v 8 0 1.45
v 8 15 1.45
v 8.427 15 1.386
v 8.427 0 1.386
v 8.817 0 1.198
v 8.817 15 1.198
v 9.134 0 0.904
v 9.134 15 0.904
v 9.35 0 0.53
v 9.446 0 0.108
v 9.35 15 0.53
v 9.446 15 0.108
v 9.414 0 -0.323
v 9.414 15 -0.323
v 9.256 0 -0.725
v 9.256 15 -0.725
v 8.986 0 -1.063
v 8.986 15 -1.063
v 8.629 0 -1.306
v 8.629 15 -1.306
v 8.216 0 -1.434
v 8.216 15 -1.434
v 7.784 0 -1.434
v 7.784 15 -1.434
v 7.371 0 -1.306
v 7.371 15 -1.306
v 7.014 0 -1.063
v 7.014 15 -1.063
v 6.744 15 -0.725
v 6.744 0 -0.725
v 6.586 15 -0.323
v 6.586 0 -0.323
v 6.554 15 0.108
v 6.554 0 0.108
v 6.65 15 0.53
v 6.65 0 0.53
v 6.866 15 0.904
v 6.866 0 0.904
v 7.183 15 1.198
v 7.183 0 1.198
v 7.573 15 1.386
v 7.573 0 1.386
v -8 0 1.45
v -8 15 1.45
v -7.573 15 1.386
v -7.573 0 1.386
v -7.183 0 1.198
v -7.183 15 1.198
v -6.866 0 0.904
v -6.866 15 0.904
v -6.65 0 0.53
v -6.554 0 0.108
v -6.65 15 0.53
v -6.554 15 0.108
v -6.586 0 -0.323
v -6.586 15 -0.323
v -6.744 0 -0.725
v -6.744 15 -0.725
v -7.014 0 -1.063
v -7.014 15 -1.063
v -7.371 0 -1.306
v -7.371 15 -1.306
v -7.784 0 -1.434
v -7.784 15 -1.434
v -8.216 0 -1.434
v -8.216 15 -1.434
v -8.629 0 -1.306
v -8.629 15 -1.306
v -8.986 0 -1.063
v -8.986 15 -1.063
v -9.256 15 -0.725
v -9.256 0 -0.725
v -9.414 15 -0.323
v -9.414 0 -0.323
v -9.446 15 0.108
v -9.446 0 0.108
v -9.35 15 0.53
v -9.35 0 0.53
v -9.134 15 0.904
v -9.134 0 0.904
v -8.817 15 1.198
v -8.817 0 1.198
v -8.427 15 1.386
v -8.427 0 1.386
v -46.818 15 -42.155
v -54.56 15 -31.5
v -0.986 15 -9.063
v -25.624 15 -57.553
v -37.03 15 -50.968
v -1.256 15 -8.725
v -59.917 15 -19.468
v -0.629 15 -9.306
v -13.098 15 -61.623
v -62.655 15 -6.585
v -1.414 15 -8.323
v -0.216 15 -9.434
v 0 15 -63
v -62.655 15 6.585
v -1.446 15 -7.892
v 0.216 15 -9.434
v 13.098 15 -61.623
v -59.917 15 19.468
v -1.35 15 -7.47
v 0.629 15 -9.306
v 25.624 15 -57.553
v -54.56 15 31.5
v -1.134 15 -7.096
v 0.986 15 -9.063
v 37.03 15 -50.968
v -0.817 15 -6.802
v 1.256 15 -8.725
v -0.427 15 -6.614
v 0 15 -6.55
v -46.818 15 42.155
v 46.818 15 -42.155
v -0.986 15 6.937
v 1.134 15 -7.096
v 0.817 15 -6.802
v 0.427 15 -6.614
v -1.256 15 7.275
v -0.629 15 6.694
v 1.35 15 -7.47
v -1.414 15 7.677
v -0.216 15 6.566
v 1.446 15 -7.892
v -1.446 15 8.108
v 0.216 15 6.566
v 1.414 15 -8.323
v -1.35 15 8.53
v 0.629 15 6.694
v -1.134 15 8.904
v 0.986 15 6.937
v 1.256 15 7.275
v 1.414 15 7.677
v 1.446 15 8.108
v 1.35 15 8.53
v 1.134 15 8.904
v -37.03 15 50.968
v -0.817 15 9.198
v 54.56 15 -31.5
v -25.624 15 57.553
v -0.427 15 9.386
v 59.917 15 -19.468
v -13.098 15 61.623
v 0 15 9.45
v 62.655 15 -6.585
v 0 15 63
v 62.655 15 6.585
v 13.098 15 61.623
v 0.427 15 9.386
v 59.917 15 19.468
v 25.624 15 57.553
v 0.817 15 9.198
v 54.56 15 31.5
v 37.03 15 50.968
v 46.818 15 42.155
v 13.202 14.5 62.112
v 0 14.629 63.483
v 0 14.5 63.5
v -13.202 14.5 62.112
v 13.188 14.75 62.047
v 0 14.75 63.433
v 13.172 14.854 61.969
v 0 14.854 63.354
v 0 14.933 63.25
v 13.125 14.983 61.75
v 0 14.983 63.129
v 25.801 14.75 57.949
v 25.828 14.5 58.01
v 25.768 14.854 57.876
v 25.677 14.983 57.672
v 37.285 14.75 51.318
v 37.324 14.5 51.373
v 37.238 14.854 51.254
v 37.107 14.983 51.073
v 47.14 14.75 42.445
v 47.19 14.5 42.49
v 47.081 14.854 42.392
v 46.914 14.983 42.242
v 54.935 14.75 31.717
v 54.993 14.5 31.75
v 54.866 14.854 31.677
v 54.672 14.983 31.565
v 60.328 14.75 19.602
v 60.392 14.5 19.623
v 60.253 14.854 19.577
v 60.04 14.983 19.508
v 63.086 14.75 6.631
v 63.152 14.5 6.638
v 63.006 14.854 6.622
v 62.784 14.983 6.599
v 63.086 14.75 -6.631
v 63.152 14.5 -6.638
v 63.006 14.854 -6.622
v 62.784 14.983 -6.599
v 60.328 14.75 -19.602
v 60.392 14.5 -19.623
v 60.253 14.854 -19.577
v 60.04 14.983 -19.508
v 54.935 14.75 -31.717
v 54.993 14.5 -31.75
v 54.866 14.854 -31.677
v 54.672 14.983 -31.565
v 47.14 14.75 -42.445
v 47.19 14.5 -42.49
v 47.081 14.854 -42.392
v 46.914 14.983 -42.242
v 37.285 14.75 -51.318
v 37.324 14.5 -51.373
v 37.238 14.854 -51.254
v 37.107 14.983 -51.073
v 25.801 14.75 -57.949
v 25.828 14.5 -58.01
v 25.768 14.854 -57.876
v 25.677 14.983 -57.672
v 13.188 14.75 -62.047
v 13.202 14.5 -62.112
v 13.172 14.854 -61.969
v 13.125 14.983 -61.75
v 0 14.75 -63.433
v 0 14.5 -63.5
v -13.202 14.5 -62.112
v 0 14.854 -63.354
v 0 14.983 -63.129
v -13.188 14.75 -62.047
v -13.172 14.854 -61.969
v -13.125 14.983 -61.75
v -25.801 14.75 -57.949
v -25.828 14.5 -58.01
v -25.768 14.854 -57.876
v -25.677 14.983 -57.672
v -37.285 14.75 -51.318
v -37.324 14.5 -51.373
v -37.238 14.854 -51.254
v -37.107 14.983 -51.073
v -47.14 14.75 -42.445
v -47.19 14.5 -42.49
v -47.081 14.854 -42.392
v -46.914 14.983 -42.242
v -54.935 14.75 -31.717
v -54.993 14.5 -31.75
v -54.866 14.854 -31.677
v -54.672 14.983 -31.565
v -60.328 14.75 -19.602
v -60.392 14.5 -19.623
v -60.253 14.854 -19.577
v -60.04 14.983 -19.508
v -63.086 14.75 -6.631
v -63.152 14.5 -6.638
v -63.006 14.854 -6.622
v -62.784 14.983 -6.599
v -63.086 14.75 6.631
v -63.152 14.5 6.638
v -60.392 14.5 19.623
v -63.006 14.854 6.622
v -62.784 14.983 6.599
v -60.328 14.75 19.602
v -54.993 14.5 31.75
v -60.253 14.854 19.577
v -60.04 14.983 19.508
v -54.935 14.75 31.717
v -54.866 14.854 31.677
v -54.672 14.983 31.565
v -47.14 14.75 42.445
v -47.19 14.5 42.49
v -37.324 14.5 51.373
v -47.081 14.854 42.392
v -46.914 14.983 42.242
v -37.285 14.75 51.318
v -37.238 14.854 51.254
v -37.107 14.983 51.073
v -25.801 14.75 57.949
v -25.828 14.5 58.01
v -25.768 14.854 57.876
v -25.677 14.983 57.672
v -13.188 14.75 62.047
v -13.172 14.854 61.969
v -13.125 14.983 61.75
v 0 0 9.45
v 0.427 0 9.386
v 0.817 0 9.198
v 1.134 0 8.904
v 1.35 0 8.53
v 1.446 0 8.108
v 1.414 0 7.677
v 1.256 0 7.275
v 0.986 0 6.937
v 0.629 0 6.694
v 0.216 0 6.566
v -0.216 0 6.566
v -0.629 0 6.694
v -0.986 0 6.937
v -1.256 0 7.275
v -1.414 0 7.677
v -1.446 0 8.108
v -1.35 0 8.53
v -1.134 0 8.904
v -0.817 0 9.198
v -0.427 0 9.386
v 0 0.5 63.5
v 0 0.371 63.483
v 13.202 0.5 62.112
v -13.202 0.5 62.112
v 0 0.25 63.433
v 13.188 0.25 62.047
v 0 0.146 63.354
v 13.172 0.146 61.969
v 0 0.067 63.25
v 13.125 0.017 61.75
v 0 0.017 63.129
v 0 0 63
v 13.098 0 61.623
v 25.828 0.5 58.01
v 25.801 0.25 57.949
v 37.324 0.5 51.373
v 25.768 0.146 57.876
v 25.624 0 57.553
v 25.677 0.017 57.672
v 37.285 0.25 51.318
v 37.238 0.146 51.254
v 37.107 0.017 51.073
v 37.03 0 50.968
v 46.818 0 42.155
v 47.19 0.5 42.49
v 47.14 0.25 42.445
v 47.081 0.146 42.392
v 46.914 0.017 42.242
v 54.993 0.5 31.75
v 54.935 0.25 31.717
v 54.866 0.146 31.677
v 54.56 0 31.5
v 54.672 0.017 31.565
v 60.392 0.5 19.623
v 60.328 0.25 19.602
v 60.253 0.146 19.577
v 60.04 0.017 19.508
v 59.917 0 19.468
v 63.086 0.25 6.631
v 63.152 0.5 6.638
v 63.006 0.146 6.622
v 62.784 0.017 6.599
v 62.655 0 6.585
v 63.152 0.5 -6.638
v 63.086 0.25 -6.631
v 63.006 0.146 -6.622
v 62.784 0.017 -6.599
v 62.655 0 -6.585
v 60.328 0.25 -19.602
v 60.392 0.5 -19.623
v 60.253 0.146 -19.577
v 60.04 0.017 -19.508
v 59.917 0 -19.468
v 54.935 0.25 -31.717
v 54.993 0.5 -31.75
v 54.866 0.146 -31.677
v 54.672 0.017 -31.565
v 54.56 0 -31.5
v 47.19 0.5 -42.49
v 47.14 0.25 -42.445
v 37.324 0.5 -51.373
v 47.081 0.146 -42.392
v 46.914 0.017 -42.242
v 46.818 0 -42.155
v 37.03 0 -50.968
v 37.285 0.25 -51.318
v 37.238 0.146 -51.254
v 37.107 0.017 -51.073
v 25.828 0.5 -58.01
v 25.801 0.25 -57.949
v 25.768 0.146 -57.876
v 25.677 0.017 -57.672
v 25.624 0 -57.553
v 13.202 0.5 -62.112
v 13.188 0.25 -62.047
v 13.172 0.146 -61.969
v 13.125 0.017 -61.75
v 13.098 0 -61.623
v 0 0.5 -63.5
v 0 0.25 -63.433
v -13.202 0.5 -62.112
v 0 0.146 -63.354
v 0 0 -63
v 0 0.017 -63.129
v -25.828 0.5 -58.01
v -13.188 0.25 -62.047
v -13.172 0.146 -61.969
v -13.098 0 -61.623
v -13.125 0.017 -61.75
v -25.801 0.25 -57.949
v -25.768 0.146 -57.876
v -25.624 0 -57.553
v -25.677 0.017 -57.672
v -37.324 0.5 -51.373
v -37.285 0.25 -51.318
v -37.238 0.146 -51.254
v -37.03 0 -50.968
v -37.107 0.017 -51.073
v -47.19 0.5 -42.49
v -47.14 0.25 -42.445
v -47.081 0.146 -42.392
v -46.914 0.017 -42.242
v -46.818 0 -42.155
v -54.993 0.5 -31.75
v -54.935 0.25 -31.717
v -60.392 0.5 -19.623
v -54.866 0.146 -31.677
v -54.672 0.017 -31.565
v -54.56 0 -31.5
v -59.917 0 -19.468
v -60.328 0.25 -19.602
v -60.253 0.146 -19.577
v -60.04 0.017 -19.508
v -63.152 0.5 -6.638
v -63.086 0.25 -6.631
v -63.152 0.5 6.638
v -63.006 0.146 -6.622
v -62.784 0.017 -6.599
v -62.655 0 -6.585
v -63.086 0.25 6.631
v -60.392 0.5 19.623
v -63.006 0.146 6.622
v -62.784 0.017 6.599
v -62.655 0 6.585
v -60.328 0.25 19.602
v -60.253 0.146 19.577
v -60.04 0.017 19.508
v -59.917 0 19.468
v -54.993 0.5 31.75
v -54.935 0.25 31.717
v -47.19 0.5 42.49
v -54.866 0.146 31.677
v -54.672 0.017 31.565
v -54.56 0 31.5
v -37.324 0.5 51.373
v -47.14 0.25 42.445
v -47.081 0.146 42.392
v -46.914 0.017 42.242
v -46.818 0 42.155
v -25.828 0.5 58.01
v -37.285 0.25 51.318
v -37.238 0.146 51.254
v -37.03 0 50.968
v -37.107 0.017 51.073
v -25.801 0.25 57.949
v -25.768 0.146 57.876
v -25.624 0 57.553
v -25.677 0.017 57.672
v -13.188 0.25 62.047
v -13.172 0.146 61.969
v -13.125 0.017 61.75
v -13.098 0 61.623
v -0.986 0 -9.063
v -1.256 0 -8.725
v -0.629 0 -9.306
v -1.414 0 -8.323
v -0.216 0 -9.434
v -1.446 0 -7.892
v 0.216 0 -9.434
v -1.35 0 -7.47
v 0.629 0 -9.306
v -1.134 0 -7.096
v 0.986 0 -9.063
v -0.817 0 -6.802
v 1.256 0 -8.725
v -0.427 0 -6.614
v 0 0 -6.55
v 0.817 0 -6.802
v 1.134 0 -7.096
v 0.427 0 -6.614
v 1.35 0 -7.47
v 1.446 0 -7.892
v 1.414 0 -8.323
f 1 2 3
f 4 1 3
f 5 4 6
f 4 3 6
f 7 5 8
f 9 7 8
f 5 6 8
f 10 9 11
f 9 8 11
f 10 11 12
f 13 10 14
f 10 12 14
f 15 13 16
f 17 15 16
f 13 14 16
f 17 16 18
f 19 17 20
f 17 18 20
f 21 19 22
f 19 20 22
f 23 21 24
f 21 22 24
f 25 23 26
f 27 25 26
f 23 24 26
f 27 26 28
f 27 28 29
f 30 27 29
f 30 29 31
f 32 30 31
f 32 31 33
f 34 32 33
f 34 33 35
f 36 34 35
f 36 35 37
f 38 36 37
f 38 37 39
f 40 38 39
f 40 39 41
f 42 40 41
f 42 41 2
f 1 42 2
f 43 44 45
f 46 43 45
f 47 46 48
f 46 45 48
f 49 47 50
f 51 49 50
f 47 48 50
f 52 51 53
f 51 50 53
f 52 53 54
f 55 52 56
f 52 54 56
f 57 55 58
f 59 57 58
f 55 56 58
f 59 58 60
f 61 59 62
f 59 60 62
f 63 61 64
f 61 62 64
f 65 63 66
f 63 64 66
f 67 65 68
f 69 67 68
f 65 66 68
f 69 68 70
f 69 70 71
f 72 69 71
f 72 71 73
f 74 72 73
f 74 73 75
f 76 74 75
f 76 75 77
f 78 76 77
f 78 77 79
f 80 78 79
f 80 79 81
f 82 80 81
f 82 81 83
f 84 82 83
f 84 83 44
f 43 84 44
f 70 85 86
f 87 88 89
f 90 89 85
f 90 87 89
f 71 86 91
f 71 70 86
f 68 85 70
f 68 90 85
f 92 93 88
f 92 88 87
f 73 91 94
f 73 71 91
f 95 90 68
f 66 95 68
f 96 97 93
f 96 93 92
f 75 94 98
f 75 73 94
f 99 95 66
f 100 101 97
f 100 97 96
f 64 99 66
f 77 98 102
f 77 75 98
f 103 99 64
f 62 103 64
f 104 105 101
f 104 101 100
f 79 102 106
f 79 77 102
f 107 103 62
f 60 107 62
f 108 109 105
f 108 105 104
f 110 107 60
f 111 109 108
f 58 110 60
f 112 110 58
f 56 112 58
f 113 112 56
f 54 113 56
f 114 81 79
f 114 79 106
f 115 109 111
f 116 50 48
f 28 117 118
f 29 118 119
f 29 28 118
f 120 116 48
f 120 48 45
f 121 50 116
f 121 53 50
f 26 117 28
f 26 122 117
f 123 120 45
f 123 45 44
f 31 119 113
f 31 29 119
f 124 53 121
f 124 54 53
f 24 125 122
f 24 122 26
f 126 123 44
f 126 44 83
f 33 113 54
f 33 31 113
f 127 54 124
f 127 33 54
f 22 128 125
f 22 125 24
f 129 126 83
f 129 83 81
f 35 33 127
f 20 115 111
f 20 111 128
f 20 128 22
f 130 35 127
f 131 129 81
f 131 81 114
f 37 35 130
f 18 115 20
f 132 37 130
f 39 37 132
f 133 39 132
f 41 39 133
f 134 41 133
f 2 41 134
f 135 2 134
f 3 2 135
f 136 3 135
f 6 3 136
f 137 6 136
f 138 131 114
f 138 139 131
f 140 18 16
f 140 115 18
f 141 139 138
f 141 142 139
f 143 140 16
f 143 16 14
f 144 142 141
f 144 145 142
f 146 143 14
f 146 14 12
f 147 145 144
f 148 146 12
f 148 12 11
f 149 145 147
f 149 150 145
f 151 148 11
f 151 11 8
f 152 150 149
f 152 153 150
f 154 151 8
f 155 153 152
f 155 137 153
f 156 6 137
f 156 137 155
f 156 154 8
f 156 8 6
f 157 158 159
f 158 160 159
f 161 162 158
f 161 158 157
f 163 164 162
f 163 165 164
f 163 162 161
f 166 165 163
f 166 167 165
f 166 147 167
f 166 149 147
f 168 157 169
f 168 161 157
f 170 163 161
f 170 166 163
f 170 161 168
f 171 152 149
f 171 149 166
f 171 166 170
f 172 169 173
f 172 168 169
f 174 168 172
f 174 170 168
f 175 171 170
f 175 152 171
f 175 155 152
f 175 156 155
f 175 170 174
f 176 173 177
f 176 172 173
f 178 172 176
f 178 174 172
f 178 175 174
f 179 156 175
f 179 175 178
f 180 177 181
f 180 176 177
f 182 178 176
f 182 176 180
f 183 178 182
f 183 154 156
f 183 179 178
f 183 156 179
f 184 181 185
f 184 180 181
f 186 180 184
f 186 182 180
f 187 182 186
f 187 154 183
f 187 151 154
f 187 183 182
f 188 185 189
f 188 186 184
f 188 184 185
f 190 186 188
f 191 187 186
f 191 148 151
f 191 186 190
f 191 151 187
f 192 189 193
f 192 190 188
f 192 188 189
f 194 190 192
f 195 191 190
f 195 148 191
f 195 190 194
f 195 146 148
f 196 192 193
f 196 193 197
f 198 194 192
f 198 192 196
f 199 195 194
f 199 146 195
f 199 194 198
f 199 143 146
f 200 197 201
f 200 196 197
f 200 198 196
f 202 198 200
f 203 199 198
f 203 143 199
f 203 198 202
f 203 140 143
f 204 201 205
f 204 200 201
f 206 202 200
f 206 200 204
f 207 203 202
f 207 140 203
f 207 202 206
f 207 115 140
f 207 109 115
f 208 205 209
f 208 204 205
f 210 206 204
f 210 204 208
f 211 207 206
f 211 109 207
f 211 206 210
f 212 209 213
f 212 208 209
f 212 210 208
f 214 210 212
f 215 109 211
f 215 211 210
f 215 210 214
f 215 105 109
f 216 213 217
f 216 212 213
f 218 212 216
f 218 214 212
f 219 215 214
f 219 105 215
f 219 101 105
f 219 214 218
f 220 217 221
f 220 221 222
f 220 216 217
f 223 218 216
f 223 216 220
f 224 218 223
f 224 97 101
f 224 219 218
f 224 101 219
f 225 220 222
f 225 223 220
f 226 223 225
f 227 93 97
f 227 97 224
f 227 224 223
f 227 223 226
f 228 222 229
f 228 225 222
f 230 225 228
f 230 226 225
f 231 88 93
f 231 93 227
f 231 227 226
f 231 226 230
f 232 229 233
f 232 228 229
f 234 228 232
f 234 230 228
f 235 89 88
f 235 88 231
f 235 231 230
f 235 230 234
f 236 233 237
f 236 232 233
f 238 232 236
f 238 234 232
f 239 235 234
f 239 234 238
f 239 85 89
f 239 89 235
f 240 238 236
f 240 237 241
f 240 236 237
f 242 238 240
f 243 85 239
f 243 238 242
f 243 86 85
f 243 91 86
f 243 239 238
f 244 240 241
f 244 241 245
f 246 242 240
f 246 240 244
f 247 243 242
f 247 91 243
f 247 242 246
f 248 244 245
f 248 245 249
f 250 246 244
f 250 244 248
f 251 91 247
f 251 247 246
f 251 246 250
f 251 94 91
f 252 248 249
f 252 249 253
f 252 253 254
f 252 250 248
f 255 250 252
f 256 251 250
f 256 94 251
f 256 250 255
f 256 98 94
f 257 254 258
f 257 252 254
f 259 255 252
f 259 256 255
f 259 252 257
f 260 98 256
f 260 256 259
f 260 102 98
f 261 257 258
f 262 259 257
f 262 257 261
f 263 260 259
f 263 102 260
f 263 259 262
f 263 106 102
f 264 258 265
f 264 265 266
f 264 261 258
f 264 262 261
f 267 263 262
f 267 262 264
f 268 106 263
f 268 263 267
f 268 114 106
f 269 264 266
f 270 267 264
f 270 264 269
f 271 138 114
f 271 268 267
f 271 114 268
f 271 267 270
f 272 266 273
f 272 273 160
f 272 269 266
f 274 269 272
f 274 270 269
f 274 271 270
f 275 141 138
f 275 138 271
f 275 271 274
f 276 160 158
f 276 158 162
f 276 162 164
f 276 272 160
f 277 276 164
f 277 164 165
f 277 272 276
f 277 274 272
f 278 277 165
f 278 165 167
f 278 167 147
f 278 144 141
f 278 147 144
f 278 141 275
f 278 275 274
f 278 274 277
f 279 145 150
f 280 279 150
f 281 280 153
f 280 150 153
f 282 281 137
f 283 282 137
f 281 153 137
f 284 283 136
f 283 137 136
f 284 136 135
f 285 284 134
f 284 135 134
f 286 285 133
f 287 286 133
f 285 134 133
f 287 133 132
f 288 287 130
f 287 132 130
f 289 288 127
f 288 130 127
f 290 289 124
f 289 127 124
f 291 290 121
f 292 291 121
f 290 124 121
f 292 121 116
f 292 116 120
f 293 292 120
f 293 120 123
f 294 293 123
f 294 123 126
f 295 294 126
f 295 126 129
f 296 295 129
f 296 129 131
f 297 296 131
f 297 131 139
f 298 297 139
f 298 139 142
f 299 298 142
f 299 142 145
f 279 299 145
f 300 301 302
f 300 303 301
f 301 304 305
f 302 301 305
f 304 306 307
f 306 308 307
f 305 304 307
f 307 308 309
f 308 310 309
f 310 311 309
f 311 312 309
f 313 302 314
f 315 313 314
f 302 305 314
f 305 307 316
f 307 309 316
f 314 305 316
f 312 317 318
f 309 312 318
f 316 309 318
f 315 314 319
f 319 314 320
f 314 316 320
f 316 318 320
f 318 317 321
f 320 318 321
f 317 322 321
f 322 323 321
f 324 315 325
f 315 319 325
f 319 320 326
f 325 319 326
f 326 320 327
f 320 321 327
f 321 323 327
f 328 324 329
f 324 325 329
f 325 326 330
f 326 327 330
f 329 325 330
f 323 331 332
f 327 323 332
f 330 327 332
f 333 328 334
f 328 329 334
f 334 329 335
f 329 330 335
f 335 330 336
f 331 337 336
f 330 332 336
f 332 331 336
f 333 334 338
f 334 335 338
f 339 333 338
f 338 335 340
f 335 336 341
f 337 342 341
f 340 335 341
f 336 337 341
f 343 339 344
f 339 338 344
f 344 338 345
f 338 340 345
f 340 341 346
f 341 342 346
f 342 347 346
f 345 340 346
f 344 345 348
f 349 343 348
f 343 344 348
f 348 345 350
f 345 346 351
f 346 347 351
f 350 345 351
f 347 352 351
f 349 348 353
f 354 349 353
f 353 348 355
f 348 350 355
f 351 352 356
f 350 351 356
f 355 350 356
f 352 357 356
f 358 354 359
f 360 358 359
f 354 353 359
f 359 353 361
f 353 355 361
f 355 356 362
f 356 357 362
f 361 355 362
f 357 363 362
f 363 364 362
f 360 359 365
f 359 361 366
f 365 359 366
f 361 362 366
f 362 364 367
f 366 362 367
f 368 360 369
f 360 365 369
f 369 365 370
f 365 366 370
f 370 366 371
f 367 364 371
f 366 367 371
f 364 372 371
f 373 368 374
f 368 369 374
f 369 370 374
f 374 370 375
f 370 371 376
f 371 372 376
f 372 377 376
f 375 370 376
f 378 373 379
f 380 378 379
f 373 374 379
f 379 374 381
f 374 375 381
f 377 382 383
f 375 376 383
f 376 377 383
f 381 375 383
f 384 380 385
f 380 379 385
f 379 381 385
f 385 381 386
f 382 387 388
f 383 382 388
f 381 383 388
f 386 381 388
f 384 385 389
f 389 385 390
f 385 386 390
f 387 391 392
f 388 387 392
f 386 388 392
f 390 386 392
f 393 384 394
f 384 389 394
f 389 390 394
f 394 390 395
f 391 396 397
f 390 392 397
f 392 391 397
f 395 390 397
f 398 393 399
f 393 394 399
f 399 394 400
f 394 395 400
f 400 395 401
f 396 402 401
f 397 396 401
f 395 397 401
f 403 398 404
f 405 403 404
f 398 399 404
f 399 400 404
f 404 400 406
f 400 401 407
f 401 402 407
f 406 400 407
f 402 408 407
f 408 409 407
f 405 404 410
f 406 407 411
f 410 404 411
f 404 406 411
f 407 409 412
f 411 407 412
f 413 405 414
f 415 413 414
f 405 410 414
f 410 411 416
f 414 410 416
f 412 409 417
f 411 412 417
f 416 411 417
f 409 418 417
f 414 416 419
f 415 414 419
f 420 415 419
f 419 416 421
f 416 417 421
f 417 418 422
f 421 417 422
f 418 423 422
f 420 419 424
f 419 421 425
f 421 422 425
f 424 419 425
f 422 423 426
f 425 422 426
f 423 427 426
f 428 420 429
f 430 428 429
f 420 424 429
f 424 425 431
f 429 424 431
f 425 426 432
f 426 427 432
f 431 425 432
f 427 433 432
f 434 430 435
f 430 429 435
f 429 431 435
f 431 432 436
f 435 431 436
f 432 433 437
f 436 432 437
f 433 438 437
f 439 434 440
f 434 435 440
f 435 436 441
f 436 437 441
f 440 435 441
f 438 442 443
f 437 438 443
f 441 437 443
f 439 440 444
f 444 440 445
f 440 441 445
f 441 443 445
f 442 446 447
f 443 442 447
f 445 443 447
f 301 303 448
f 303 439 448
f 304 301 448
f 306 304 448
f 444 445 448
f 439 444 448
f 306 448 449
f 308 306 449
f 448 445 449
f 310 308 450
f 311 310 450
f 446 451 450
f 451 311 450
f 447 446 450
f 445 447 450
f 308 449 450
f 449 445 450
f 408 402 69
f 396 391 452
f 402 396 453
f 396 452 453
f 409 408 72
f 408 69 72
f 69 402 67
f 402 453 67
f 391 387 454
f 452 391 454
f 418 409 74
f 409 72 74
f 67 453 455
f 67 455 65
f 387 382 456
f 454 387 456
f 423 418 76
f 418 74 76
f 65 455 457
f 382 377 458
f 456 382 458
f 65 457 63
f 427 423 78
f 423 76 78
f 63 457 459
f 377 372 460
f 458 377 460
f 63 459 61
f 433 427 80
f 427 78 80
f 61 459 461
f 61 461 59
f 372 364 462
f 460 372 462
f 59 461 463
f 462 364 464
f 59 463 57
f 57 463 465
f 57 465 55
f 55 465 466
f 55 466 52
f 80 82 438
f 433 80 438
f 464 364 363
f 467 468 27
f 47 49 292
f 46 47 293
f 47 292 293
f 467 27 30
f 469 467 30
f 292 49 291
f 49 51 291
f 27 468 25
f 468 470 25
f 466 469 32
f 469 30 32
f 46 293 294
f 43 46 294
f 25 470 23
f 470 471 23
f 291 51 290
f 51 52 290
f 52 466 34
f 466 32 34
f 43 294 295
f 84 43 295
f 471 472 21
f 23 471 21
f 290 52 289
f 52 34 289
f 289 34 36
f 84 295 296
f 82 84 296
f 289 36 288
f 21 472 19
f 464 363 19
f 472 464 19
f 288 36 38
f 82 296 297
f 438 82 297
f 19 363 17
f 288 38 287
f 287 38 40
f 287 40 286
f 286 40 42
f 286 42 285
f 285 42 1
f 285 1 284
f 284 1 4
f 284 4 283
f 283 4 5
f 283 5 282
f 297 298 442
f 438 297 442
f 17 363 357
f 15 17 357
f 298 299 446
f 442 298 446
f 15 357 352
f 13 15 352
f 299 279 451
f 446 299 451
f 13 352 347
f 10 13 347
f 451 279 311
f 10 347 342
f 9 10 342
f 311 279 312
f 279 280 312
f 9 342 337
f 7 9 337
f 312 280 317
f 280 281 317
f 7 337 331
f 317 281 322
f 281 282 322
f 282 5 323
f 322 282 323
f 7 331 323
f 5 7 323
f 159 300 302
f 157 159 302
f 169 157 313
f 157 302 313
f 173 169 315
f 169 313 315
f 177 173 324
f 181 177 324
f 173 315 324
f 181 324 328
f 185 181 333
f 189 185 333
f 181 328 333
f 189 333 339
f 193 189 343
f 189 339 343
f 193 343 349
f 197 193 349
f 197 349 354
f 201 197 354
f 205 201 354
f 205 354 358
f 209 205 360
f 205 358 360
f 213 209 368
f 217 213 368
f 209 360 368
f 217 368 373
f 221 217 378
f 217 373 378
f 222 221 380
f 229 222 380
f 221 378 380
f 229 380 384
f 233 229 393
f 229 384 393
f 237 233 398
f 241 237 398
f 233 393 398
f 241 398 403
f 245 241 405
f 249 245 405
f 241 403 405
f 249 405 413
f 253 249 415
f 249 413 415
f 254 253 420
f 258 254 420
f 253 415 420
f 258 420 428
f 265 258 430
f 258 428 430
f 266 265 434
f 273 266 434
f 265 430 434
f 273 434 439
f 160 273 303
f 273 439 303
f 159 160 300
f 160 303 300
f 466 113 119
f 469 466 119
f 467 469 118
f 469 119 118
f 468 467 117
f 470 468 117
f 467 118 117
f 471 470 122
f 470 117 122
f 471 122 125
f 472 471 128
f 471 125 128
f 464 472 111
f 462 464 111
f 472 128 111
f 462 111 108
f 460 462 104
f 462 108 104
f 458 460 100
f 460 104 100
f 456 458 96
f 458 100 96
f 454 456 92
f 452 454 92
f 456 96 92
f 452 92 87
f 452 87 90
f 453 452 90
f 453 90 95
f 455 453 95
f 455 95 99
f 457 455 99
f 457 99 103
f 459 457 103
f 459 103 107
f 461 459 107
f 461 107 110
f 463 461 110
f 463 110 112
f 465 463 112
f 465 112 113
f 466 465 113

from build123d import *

# Parameters (mm, degrees)
SKETCH2_R           = 63.5
BOSS_EXTRUDE1_DEPTH = 15
SKETCH3_R           = 1.45
CUT_EXTRUDE1_DEPTH  = 92.046691318
FILLET2_R           = 0.5


with BuildPart() as part:
    # Sketch2 → Boss-Extrude1 (new body)
    with BuildSketch(Plane(origin=(0, 0, 0), x_dir=(1, 0, 0), z_dir=(0, 1, 0))):
        with Locations(Location((0, 0, 0), (0, 0, 270))):
            Circle(SKETCH2_R)
    extrude(amount=BOSS_EXTRUDE1_DEPTH)

    # Sketch3 → Cut-Extrude1 (cut, through all)
    with BuildSketch(Plane(origin=(0, 15, 0), x_dir=(1, 0, 0), z_dir=(0, 1, 0))):
        with Locations(Location((0, 8, 0), (0, 0, 270))):
            Circle(SKETCH3_R)
        with Locations(Location((8, 0, 0), (0, 0, 270))):
            Circle(SKETCH3_R)
        with Locations(Location((0, -8, 0), (0, 0, 270))):
            Circle(SKETCH3_R)
        with Locations(Location((-8, 0, 0), (0, 0, 270))):
            Circle(SKETCH3_R)
    extrude(amount=-CUT_EXTRUDE1_DEPTH, mode=Mode.SUBTRACT)

    # Fillet2
    fillet2_edges = [part.edges().sort_by_distance(p)[0] for p in [
        (0, 0, -63.5),
        (0, 15, -63.5),
    ]]
    fillet(fillet2_edges, radius=FILLET2_R)


solid = part.part
